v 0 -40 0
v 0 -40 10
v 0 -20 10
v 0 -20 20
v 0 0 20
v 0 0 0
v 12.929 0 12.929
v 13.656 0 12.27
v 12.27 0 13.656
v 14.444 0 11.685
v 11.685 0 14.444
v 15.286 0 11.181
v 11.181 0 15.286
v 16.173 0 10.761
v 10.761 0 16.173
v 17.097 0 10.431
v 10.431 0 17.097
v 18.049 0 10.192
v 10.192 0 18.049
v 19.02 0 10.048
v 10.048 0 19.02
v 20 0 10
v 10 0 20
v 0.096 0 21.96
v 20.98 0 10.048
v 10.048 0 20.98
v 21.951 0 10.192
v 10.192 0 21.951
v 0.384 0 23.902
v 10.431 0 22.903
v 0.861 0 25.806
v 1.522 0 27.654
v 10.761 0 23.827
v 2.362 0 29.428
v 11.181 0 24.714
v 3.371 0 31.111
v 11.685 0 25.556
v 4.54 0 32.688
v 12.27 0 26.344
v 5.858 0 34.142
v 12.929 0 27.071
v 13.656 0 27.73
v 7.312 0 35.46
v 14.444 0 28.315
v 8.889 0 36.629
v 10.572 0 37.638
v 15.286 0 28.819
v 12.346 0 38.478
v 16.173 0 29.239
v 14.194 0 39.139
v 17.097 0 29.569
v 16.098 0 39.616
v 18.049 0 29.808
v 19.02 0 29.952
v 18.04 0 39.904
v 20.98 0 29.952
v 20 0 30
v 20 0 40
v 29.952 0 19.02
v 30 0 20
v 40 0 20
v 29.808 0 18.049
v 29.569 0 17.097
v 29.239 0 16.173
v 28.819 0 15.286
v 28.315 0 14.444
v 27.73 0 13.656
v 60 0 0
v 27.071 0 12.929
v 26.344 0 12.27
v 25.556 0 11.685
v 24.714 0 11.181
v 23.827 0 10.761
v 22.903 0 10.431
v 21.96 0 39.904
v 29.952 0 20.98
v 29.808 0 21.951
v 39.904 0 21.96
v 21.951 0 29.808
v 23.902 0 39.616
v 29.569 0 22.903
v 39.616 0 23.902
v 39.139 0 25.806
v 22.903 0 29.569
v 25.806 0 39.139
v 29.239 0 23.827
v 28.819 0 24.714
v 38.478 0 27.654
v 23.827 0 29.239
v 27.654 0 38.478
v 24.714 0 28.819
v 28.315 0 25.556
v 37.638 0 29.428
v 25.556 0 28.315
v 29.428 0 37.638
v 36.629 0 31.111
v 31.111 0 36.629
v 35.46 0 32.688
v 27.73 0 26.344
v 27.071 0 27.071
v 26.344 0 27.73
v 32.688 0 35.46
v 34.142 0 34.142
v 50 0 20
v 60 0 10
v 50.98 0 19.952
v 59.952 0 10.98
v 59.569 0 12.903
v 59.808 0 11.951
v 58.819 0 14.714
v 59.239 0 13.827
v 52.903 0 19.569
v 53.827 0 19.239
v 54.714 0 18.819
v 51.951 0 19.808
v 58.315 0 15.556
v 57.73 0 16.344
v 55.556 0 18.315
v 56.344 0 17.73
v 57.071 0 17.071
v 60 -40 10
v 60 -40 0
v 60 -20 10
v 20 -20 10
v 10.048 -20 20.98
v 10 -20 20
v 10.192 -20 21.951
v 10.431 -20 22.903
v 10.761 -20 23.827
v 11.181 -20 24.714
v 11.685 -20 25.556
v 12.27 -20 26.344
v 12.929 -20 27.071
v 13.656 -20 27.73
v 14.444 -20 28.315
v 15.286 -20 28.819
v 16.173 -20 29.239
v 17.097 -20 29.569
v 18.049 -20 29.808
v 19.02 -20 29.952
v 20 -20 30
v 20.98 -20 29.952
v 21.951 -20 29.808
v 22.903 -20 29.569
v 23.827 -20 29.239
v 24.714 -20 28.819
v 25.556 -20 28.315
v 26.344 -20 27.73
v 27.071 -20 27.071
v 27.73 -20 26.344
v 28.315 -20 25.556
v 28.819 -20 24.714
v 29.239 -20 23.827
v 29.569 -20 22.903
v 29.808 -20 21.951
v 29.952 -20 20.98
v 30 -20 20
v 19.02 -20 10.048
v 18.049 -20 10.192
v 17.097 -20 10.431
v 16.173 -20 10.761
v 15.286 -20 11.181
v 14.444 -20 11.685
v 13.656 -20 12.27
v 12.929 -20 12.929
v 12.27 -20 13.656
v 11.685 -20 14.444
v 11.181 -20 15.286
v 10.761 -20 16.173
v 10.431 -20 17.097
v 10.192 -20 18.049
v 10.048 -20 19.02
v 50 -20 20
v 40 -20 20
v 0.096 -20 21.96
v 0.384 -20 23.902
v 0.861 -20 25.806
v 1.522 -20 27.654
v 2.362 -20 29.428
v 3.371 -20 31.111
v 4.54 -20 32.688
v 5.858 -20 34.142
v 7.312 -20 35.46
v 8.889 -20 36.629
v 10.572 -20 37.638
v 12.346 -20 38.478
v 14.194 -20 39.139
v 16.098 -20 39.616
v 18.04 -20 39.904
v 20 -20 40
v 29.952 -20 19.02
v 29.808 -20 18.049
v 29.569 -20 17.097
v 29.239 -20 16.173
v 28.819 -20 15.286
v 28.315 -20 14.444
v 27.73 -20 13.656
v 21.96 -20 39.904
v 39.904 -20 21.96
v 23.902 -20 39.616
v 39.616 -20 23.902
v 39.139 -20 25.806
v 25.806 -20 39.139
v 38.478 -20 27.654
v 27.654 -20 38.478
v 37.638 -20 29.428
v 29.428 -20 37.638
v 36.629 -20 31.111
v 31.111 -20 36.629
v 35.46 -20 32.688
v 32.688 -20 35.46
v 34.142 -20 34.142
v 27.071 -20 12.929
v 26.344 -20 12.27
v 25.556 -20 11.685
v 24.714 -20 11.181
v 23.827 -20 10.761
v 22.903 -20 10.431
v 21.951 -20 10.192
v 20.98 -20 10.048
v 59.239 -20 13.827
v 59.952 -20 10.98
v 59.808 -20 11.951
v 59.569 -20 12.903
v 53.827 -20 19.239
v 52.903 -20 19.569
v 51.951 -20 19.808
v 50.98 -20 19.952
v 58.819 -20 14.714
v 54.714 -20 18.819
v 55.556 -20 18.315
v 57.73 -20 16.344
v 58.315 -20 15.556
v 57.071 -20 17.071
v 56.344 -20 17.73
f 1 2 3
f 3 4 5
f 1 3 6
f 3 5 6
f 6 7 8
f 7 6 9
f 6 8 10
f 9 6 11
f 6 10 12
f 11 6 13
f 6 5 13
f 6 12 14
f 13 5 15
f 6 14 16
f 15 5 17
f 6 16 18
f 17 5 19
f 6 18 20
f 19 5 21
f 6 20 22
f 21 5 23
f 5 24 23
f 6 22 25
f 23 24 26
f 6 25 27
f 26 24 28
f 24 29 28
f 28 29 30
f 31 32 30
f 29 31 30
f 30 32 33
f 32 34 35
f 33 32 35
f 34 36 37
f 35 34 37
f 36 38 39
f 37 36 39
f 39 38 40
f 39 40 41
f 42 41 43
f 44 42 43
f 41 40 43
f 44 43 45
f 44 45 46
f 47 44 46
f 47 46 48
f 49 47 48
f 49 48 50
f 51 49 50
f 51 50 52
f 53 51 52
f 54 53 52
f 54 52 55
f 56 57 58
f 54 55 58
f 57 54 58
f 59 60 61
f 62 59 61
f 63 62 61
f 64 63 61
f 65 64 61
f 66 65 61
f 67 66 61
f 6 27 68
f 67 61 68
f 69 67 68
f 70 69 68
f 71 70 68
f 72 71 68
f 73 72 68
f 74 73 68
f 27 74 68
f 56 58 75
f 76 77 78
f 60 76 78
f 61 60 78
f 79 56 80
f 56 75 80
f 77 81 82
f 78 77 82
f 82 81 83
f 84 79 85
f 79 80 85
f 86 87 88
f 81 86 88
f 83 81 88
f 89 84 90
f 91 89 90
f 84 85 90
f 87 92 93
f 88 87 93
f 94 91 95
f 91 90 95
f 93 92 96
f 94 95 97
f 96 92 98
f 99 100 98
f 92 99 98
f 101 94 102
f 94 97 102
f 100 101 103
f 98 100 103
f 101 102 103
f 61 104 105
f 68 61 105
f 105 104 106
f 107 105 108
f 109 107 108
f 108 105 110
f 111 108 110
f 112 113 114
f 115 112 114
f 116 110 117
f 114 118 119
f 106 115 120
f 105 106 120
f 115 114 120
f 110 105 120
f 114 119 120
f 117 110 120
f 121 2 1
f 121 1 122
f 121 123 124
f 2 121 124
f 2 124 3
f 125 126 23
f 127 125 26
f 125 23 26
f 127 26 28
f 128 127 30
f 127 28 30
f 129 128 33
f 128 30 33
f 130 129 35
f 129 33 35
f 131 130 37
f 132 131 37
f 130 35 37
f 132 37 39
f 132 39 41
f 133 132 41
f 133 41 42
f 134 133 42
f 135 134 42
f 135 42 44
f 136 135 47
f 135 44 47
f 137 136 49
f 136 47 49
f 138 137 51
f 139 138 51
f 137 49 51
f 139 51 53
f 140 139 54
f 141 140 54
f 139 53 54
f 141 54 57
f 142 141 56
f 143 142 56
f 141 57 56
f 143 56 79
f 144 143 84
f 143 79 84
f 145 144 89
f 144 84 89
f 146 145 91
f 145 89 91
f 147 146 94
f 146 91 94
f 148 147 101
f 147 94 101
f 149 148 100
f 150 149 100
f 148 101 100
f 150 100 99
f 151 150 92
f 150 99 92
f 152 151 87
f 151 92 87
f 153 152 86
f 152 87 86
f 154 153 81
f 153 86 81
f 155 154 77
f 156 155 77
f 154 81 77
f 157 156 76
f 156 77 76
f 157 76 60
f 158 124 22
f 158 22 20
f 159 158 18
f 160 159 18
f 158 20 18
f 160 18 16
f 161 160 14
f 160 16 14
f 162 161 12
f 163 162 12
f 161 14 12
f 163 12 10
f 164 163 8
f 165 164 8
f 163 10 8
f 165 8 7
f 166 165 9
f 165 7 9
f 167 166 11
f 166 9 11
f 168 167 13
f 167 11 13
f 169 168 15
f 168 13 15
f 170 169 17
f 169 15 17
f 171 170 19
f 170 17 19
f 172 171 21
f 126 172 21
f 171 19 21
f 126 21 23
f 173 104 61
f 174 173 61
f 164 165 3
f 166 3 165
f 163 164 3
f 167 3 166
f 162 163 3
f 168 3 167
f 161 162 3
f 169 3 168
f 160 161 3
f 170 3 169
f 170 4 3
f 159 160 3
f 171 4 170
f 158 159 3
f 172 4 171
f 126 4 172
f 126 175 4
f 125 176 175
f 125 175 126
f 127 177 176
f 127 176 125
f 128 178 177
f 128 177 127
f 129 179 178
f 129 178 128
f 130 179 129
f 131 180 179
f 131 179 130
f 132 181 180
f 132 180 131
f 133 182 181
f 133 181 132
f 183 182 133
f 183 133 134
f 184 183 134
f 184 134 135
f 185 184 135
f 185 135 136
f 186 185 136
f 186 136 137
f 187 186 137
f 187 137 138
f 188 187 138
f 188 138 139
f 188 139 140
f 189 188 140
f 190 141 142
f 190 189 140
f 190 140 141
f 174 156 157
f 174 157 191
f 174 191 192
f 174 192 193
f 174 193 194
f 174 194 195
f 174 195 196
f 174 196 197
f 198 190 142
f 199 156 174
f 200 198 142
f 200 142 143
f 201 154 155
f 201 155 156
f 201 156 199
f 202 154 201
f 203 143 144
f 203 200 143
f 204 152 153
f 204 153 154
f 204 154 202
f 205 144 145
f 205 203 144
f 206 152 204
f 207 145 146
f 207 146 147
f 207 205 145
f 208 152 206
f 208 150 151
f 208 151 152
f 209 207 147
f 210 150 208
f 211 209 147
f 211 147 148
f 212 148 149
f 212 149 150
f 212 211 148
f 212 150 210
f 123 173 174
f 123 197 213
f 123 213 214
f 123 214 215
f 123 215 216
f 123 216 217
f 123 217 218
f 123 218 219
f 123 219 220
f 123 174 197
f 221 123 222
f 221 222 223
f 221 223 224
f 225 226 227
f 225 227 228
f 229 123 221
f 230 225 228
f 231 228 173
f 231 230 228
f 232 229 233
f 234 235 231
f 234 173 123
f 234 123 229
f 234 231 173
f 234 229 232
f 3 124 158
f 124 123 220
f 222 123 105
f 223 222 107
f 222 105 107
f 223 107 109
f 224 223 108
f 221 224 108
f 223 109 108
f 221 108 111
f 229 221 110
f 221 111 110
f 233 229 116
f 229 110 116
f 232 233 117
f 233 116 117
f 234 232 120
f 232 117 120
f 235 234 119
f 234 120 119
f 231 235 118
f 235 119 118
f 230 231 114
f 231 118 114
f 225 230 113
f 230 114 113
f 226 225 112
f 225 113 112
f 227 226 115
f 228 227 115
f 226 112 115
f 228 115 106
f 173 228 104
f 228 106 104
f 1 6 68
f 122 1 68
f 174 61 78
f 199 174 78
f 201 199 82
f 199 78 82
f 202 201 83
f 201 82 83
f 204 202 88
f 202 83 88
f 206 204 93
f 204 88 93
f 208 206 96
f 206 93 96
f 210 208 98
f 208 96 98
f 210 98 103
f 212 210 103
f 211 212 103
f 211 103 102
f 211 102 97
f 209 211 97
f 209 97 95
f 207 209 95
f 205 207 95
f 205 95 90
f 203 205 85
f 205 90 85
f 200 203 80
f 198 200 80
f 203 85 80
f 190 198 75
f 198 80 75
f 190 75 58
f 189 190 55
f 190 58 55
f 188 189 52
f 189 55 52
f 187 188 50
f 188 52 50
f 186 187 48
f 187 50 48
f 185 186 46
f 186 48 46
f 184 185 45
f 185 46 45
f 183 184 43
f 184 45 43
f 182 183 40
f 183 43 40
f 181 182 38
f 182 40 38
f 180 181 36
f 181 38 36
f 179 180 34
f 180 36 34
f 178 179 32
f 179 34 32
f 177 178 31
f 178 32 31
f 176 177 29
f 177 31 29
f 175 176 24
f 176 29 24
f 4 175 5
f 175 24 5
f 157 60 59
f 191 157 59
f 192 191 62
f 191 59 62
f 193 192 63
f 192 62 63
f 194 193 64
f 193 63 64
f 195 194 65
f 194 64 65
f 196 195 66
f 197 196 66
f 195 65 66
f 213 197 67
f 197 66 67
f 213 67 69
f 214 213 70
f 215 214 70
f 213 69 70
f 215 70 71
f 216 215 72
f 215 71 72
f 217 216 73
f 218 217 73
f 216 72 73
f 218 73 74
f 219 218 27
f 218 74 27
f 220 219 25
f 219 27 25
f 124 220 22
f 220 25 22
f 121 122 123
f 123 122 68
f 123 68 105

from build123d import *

# Parameters (mm, degrees)
F1_DEPTH = 40
F2_DEPTH = 20


with BuildPart() as f1:
    # F0 (on Front) → F1 (new body)
    with BuildSketch(Plane.XZ):
        with BuildLine():
            ThreePointArc((37.3205080757, 10), (30, 2.6794919243), (20, 0))
            Line((20, 0), (60, 0))
            Line((60, 0), (60, 10))
            Line((60, 10), (37.3205080757, 10))
        make_face()
        with BuildLine():
            Line((0, 10), (0, 0))
            Line((0, 0), (20, 0))
            ThreePointArc((20, 0), (10, 2.6794919243), (2.6794919243, 10))
            Line((2.6794919243, 10), (0, 10))
        make_face()
        with BuildLine():
            ThreePointArc((2.6794919243, 10), (10, 2.6794919243), (20, 0))
            ThreePointArc((20, 0), (30, 2.6794919243), (37.3205080757, 10))
            Line((37.3205080757, 10), (19.9999999466, 10))
            Line((19.9999999466, 10), (2.6794919243, 10))
        make_face()
    extrude(amount=F1_DEPTH)

    # F0 (on Front) → F2 (join)
    with BuildSketch(Plane.XZ):
        with BuildLine():
            Line((0, 10), (0, 0))
            Line((0, 0), (20, 0))
            ThreePointArc((20, 0), (10, 2.6794919243), (2.6794919243, 10))
            Line((2.6794919243, 10), (0, 10))
        make_face()
        with BuildLine():
            Line((0, 20), (0, 10))
            Line((0, 10), (2.6794919243, 10))
            ThreePointArc((2.6794919243, 10), (0.6814834742, 14.8236190979), (0, 20))
        make_face()
        with BuildLine():
            ThreePointArc((37.3205080757, 10), (30, 2.6794919243), (20, 0))
            Line((20, 0), (60, 0))
            Line((60, 0), (60, 10))
            Line((60, 10), (37.3205080757, 10))
        make_face()
        with BuildLine():
            ThreePointArc((2.6794919243, 10), (10, 2.6794919243), (20, 0))
            ThreePointArc((20, 0), (30, 2.6794919243), (37.3205080757, 10))
            Line((37.3205080757, 10), (19.9999999466, 10))
            Line((19.9999999466, 10), (2.6794919243, 10))
        make_face()
        with BuildLine():
            ThreePointArc((0, 20), (0.6814834742, 14.8236190979), (2.6794919243, 10))
            Line((2.6794919243, 10), (19.9999999466, 10))
            ThreePointArc((19.9999999466, 10), (12.9289321693, 12.928932207), (10, 20))
            Line((10, 20), (0, 20))
        make_face()
        with BuildLine():
            ThreePointArc((40, 20), (20, 40), (0, 20))
            Line((0, 20), (10, 20))
            ThreePointArc((10, 20), (20, 30), (30, 20))
            Line((30, 20), (40, 20))
        make_face()
        with BuildLine():
            ThreePointArc((40, 20), (39.3185165258, 14.8236190979), (37.3205080757, 10))
            Line((37.3205080757, 10), (60, 10))
            ThreePointArc((60, 10), (57.0710678119, 17.0710678119), (50, 20))
            Line((50, 20), (40, 20))
        make_face()
        with BuildLine():
            Line((19.9999999466, 10), (37.3205080757, 10))
            ThreePointArc((37.3205080757, 10), (39.3185165258, 14.8236190979), (40, 20))
            Line((40, 20), (30, 20))
            ThreePointArc((30, 20), (27.071067793, 12.9289321693), (19.9999999466, 10))
        make_face()
    extrude(amount=F2_DEPTH)


solid = f1.part
